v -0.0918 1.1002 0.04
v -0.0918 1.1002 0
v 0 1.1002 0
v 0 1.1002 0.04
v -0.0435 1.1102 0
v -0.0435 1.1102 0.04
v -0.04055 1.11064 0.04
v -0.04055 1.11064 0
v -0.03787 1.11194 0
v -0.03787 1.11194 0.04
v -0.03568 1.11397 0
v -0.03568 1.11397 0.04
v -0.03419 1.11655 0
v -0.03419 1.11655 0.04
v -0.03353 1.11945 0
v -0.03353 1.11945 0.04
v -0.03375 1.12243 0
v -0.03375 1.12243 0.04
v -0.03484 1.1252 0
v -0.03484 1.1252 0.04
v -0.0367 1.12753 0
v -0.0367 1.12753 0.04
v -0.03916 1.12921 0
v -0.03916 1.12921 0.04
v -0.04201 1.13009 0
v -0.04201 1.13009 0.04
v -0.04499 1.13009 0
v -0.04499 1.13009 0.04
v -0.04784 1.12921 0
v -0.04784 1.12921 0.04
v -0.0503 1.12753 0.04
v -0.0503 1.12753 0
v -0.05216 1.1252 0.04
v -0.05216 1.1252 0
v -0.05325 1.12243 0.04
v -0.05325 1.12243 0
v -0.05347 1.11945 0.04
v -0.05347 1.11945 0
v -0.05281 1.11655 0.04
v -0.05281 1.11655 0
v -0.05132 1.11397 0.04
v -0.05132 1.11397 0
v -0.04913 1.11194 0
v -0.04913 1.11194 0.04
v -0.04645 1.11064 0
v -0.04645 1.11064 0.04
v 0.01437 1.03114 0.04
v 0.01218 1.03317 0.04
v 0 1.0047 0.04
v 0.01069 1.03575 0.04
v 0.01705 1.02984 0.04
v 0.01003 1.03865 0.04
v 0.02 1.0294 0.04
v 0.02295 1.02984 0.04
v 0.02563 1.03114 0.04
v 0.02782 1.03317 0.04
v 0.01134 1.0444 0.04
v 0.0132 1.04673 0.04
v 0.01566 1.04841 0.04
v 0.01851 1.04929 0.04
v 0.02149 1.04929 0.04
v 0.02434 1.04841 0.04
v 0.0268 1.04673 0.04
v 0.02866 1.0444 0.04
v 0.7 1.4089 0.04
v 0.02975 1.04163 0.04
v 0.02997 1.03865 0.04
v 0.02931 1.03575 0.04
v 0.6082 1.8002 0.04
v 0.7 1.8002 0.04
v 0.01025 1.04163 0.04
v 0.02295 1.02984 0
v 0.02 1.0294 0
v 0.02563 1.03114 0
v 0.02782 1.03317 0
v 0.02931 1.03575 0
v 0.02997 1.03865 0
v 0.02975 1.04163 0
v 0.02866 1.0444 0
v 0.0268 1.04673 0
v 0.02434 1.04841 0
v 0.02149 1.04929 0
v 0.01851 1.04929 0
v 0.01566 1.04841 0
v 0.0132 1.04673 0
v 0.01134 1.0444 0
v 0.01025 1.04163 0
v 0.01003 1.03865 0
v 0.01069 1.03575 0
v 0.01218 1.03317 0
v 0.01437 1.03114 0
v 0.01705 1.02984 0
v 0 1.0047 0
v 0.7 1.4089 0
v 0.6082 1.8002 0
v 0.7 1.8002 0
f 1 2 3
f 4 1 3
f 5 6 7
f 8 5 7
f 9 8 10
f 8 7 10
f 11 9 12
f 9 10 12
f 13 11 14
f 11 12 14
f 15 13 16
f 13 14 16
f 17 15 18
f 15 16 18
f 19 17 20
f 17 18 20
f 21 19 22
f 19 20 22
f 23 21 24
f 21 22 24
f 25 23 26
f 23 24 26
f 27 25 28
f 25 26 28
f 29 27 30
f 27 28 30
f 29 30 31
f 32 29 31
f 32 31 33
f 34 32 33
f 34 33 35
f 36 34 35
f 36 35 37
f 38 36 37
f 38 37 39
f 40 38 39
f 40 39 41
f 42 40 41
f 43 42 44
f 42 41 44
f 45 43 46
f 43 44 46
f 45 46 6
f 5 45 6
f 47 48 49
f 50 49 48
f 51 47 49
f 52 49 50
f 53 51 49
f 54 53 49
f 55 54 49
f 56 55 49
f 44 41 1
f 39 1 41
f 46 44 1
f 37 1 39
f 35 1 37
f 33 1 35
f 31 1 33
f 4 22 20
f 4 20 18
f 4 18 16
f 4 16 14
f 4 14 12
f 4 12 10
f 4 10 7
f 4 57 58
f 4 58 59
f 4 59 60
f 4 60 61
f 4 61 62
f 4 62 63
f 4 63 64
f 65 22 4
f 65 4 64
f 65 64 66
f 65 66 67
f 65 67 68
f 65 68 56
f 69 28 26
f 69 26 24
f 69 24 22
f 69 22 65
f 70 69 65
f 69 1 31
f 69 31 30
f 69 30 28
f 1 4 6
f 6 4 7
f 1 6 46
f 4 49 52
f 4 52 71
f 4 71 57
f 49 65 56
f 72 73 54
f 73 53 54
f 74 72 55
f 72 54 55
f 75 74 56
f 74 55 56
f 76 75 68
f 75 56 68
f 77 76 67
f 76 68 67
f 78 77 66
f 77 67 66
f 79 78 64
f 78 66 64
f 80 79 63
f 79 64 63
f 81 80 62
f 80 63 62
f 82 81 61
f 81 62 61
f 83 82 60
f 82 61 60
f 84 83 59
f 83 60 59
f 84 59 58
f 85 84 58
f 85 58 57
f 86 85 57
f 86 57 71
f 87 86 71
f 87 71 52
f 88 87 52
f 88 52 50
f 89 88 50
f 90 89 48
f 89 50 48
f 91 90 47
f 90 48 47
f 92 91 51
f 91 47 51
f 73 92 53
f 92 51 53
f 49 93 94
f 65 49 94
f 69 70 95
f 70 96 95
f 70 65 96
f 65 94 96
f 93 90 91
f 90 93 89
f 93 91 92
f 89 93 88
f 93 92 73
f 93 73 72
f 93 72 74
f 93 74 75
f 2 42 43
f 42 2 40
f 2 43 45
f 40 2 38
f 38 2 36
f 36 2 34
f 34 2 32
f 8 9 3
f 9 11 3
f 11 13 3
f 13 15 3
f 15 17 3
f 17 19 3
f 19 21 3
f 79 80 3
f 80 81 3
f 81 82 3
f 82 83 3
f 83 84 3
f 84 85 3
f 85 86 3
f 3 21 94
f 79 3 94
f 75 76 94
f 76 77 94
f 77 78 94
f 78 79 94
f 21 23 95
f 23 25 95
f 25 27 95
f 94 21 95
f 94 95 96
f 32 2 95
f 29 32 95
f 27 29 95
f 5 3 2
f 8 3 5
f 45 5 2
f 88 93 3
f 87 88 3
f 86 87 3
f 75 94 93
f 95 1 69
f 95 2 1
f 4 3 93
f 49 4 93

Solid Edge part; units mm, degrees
sketch "Sketch1" plane through (0, 0, 0) normal (0, 0, 1) x (1, 0, 0)
  line L0 (0, 1.0047) -> (0.7, 1.4089)
  line L1 (0.7, 1.4089) -> (0.7, 1.8002)
  line L2 (0.7, 1.8002) -> (0.6082, 1.8002)
  line L3 (-0.0918, 1.1002) -> (0.6082, 1.8002)
  line L4 (-0.0918, 1.1002) -> (0, 1.1002)
  line L5 (0, 1.1002) -> (0, 1.0047)
extrude "Protrusion1" add sketch "Sketch1" along normal blind 0.04
hole "Bohrung_5" at (-0.0435, 1.1202, 0.04) direction (0, 0, 1) diameter 0.02 end through all both ways yes
hole "Hole1" at (0.02, 1.0394, 0.04) direction (0, 0, 1) diameter 0.02 end through all both ways yes
